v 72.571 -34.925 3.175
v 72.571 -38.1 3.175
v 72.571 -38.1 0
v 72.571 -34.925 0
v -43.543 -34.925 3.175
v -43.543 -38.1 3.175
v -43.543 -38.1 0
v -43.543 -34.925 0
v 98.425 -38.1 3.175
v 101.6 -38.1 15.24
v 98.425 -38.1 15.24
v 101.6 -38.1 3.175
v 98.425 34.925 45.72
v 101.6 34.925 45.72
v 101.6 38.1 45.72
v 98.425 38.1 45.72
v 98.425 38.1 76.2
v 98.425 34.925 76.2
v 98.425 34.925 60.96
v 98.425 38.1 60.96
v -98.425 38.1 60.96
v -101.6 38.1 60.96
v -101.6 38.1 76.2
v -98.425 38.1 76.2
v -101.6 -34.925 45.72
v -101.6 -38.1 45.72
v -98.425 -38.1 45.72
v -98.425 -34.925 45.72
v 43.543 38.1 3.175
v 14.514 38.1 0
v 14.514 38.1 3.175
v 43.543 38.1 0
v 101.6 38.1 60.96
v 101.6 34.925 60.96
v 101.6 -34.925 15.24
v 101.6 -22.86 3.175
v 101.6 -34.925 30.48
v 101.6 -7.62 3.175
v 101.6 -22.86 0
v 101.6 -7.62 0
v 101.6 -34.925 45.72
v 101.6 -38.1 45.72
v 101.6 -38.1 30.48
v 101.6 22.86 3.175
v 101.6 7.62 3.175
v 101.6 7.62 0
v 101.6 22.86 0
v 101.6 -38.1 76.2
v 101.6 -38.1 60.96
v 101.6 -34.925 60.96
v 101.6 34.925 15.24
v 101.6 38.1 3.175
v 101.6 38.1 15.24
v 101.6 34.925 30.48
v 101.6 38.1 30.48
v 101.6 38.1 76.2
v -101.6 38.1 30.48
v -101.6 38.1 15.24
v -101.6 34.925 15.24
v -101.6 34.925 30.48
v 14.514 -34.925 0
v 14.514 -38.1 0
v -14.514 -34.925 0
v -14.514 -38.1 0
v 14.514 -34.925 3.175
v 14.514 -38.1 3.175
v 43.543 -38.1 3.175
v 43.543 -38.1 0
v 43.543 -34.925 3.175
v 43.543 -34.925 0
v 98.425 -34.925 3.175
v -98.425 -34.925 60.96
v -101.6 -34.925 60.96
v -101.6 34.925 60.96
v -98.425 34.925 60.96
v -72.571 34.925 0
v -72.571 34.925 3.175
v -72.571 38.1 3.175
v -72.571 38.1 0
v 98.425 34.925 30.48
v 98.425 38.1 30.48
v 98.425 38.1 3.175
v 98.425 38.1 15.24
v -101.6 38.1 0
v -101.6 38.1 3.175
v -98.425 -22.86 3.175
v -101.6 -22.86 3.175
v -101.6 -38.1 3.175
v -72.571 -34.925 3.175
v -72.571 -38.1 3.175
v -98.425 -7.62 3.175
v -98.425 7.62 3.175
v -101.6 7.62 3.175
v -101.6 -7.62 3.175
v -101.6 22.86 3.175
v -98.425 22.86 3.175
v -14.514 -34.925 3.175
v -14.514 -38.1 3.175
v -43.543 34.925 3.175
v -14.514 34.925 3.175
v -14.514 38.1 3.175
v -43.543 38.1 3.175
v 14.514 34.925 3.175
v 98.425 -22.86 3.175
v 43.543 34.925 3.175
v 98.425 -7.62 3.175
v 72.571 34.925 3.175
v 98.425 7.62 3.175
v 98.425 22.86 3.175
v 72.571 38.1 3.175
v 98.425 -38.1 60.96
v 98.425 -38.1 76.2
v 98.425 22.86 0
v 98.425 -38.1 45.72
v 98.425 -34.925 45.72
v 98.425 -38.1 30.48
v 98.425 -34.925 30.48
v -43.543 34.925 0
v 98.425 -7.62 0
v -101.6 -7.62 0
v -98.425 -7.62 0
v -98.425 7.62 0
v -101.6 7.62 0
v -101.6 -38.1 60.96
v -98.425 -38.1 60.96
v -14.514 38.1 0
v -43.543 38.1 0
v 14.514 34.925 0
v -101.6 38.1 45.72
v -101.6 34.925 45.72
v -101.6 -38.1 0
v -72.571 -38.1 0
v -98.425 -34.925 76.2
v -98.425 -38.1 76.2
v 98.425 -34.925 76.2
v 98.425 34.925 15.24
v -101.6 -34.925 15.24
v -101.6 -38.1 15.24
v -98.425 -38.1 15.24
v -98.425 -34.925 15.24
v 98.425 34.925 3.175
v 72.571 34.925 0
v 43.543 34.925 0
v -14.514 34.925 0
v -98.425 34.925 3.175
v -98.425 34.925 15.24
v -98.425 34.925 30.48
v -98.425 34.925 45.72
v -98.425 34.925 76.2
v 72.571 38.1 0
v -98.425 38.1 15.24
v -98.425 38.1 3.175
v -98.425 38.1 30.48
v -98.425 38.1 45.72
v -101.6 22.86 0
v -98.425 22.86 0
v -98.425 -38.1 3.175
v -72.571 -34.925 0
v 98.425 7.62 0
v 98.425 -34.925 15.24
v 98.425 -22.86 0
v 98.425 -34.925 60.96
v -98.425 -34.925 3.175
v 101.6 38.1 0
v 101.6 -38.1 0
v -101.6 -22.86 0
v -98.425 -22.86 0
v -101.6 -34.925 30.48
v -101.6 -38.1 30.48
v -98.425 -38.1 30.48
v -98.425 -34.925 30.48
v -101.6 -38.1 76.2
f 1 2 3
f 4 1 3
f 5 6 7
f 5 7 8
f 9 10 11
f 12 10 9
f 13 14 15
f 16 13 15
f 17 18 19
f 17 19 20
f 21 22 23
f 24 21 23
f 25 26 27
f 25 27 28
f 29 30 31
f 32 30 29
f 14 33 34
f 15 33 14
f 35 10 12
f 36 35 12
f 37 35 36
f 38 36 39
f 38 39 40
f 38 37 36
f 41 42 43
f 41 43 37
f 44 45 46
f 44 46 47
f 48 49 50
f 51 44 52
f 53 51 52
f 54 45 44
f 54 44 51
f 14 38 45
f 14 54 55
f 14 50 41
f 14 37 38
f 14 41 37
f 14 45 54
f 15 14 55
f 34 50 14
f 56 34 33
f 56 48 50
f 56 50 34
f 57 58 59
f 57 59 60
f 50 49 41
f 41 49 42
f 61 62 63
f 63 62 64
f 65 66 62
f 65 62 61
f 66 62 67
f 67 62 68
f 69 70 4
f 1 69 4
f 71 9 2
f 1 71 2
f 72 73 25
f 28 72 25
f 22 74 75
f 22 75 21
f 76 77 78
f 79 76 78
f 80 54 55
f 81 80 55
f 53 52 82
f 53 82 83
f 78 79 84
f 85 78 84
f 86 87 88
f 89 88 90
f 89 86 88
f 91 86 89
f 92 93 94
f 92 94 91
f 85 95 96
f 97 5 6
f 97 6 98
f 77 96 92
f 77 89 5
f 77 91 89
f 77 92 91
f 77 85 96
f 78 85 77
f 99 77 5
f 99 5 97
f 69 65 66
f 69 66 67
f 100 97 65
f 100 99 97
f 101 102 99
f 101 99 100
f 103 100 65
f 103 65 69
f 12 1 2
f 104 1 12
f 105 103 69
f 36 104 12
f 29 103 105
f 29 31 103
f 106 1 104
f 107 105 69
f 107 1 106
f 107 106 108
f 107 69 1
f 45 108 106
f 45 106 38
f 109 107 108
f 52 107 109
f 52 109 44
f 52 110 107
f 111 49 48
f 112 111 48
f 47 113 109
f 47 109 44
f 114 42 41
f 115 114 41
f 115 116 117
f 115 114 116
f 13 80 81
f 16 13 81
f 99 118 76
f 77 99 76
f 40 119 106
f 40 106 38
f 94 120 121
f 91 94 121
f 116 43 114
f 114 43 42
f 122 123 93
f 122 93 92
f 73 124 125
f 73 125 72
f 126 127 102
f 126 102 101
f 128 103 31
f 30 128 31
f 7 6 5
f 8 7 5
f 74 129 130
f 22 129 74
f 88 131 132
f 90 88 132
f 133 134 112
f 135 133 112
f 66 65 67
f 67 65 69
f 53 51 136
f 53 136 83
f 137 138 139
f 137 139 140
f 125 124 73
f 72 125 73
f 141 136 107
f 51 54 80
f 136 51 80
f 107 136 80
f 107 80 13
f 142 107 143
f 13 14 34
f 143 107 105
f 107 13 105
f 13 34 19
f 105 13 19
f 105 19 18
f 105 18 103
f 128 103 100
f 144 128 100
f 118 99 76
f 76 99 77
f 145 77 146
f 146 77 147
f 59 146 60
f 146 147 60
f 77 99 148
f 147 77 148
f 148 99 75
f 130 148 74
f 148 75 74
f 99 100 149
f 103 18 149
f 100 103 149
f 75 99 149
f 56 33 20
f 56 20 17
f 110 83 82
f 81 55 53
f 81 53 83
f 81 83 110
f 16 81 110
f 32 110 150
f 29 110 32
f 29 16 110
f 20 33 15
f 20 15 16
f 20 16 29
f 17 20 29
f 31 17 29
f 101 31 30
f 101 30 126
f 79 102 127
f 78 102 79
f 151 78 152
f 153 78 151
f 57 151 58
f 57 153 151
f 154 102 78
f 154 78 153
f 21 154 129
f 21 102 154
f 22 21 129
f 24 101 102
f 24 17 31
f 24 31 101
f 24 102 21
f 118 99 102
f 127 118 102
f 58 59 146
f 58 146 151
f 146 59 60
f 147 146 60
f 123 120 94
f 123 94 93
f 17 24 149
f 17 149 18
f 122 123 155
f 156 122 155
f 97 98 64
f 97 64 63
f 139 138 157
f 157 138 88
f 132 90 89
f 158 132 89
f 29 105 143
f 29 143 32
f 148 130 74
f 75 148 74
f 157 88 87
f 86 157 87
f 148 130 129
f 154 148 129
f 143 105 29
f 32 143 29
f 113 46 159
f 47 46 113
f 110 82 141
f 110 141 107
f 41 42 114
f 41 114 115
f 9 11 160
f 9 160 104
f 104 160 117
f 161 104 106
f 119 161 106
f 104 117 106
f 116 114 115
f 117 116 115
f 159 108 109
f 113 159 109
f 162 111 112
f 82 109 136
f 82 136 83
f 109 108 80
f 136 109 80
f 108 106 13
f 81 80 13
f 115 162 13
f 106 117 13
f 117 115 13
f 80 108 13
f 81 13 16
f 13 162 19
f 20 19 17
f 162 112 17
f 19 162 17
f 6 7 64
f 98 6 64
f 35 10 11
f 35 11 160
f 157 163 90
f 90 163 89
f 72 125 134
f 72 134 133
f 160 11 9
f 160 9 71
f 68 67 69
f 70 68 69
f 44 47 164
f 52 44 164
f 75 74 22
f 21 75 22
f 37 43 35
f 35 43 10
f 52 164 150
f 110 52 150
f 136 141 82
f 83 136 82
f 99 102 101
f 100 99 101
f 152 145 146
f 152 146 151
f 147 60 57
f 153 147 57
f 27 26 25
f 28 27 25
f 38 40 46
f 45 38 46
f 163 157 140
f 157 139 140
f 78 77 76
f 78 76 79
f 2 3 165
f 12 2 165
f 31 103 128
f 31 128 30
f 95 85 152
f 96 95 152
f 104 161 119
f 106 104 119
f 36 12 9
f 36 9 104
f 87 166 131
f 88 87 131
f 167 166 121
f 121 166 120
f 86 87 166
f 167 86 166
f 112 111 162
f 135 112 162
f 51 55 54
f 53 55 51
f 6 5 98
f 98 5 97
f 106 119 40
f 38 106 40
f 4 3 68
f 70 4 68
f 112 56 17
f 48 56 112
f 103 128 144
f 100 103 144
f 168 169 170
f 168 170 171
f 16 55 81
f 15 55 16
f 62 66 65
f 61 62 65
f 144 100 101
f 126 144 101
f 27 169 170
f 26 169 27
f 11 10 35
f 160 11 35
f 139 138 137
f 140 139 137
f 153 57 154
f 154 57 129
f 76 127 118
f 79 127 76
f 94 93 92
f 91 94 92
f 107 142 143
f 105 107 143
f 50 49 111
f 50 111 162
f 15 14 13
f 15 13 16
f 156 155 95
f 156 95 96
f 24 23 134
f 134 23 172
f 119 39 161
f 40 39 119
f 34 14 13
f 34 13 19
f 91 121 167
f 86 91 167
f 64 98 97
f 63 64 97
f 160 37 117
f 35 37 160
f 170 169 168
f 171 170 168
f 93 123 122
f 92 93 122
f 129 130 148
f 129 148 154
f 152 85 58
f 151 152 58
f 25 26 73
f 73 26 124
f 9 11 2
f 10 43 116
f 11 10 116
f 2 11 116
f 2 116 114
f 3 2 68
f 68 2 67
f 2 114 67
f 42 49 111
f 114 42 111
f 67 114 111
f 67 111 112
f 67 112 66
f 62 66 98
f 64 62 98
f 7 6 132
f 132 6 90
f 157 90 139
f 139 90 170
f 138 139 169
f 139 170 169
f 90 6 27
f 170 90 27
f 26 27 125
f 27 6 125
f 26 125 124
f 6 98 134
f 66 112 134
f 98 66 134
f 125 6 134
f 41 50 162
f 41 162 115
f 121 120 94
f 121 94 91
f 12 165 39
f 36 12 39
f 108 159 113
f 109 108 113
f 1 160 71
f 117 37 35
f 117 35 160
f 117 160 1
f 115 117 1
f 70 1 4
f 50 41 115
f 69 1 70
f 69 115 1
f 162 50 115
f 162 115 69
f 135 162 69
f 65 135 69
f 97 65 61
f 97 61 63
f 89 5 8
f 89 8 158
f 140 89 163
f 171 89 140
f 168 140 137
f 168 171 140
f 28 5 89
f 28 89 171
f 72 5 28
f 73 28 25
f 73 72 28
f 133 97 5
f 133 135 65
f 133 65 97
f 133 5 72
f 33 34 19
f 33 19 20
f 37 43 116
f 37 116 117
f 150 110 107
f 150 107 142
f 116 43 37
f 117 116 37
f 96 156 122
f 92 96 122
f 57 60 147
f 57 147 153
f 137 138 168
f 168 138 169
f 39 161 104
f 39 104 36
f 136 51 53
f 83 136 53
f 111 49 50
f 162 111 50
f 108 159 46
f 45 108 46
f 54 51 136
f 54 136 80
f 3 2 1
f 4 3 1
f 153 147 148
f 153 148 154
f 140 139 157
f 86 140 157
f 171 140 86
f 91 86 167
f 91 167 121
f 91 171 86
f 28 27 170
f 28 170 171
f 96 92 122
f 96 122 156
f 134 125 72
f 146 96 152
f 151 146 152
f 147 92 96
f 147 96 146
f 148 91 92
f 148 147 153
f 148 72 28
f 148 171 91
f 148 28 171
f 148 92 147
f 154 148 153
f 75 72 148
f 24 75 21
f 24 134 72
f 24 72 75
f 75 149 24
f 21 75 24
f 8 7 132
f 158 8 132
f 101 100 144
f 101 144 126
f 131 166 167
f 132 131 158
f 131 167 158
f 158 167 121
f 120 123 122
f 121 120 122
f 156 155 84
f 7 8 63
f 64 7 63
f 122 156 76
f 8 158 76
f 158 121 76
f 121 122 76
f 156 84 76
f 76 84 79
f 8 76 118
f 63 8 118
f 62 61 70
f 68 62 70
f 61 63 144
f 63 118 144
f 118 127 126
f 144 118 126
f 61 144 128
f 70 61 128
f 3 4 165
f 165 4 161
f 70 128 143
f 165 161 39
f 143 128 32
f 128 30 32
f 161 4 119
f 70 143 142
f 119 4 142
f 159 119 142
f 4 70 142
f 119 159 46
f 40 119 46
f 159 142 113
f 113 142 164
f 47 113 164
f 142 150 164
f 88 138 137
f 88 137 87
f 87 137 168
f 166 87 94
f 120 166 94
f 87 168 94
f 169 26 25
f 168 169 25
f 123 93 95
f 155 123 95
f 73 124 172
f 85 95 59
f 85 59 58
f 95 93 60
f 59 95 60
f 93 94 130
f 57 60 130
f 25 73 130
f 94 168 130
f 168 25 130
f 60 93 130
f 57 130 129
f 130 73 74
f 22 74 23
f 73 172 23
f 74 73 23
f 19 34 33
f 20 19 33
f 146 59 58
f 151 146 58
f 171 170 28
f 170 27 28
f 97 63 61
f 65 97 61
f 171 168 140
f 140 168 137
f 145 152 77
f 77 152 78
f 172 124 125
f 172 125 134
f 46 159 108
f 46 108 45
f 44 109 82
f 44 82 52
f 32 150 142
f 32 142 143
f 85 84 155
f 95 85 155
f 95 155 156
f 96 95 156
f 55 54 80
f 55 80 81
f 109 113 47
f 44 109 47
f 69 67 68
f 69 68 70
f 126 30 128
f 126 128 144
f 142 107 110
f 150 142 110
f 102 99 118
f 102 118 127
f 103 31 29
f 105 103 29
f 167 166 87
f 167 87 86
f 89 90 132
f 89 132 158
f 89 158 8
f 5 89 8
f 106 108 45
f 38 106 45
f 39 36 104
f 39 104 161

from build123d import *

# Parameters (mm, degrees)
F0_W     = 3.175
F0_H     = 3.175
F0_H_2   = 12.065
F0_W_2   = 25.8535714286
F0_H_3   = 15.24
F0_W_3   = 29.0285714286
F1_DEPTH = 3.175
F2_W     = 3.175
F2_H     = 15.24
F2_H_2   = 12.065
F2_H_3   = 3.175
F3_DEPTH = 3.175
F7_DEPTH = 3.175


with BuildPart() as f1:
    # F0 (on Top) → F1 (new body)
    with BuildSketch(Plane.XY):
        with Locations((-100.0125, 36.5125)):
            Rectangle(F0_W, F0_H)
        with Locations((-100.0125, 28.8925)):
            Rectangle(F0_W, F0_H_2)
        with Locations((-85.4982142857, 36.5125)):
            Rectangle(F0_W_2, F0_H)
        Polygon((98.425, 22.86), (98.425, 34.925), (72.5714285714, 34.925), (43.5428571429, 34.925), (14.5142857143, 34.925), (-14.5142857143, 34.925), (-43.5428571429, 34.925), (-72.5714285714, 34.925), (-98.425, 34.925), (-98.425, 22.86), (-98.425, 7.62), (-98.425, -7.62), (-98.425, -22.86), (-98.425, -34.925), (-72.5714285714, -34.925), (-43.5428571429, -34.925), (-14.5142857143, -34.925), (14.5142857143, -34.925), (43.5428571429, -34.925), (72.5714285714, -34.925), (98.425, -34.925), (98.425, -22.86), (98.425, -7.62), (98.425, 7.62), align=None)
        with Locations((-100.0125, 0)):
            Rectangle(F0_W, F0_H_3)
        with Locations((-100.0125, -28.8925)):
            Rectangle(F0_W, F0_H_2)
        with Locations((-100.0125, -36.5125)):
            Rectangle(F0_W, F0_H)
        with Locations((-85.4982142857, -36.5125)):
            Rectangle(F0_W_2, F0_H)
        with Locations((-29.0285714286, -36.5125)):
            Rectangle(F0_W_3, F0_H)
        with Locations((29.0285714286, -36.5125)):
            Rectangle(F0_W_3, F0_H)
        with Locations((85.4982142857, -36.5125)):
            Rectangle(F0_W_2, F0_H)
        with Locations((100.0125, -36.5125)):
            Rectangle(F0_W, F0_H)
        with Locations((100.0125, -28.8925)):
            Rectangle(F0_W, F0_H_2)
        with Locations((100.0125, 0)):
            Rectangle(F0_W, F0_H_3)
        with Locations((100.0125, 28.8925)):
            Rectangle(F0_W, F0_H_2)
        with Locations((100.0125, 36.5125)):
            Rectangle(F0_W, F0_H)
        with Locations((85.4982142857, 36.5125)):
            Rectangle(F0_W_2, F0_H)
        with Locations((29.0285714286, 36.5125)):
            Rectangle(F0_W_3, F0_H)
        with Locations((-29.0285714286, 36.5125)):
            Rectangle(F0_W_3, F0_H)
    extrude(amount=F1_DEPTH)


with BuildPart() as f3:
    # F2 (on face) → F3 (new body)
    with BuildSketch(Plane.YZ.offset(101.6)):
        Polygon((-22.86, 3.175), (-22.86, 0), (34.925, 0), (34.925, 15.24), (34.925, 30.48), (34.925, 45.72), (34.925, 60.96), (34.925, 76.2), (-34.925, 76.2), (-34.925, 60.96), (-34.925, 45.72), (-34.925, 30.48), (-34.925, 15.24), (-34.925, 3.175), align=None)
        with Locations((-36.5125, 68.58)):
            Rectangle(F2_W, F2_H)
        with Locations((-36.5125, 38.1)):
            Rectangle(F2_W, F2_H)
        with Locations((-36.5125, 9.2075)):
            Rectangle(F2_W, F2_H_2)
        with Locations((-36.5125, 1.5875)):
            Rectangle(F2_W, F2_H_3)
        with Locations((36.5125, 7.62)):
            Rectangle(F2_W, F2_H)
        with Locations((36.5125, 38.1)):
            Rectangle(F2_W, F2_H)
        with Locations((36.5125, 68.58)):
            Rectangle(F2_W, F2_H)
    extrude(amount=-F3_DEPTH)


with BuildPart() as f4_1:
    # F4: instance of F3
    add(f3.part.mirror(Plane.YZ))

    # F5: cut F1
    add(f1.part, mode=Mode.SUBTRACT)


with BuildPart() as f3_1:
    add(f3.part)

    # F5: cut F1
    add(f1.part, mode=Mode.SUBTRACT)


with BuildPart() as f7:
    # F6 (on face) → F7 (new body)
    with BuildSketch(Plane(origin=(0, 38.1, 0), x_dir=(-1, 0, 0), z_dir=(0, 1, 0))):
        Polygon((-72.5714285714, 3.175), (-72.5714285714, 0), (101.6, 0), (101.6, 76.2), (-101.6, 76.2), (-101.6, 3.175), align=None)
    extrude(amount=-F7_DEPTH)


with BuildPart() as f8_1:
    # F8: instance of F7
    add(f7.part.mirror(Plane.XZ))

    # F9: cut F4_1, F1, F3
    add(f4_1.part, mode=Mode.SUBTRACT)
    add(f1.part, mode=Mode.SUBTRACT)
    add(f3_1.part, mode=Mode.SUBTRACT)


with BuildPart() as f7_1:
    add(f7.part)

    # F9: cut F4_1, F1, F3
    add(f4_1.part, mode=Mode.SUBTRACT)
    add(f1.part, mode=Mode.SUBTRACT)
    add(f3_1.part, mode=Mode.SUBTRACT)


solid = Compound([f1.part, f4_1.part, f3_1.part, f8_1.part, f7_1.part])
